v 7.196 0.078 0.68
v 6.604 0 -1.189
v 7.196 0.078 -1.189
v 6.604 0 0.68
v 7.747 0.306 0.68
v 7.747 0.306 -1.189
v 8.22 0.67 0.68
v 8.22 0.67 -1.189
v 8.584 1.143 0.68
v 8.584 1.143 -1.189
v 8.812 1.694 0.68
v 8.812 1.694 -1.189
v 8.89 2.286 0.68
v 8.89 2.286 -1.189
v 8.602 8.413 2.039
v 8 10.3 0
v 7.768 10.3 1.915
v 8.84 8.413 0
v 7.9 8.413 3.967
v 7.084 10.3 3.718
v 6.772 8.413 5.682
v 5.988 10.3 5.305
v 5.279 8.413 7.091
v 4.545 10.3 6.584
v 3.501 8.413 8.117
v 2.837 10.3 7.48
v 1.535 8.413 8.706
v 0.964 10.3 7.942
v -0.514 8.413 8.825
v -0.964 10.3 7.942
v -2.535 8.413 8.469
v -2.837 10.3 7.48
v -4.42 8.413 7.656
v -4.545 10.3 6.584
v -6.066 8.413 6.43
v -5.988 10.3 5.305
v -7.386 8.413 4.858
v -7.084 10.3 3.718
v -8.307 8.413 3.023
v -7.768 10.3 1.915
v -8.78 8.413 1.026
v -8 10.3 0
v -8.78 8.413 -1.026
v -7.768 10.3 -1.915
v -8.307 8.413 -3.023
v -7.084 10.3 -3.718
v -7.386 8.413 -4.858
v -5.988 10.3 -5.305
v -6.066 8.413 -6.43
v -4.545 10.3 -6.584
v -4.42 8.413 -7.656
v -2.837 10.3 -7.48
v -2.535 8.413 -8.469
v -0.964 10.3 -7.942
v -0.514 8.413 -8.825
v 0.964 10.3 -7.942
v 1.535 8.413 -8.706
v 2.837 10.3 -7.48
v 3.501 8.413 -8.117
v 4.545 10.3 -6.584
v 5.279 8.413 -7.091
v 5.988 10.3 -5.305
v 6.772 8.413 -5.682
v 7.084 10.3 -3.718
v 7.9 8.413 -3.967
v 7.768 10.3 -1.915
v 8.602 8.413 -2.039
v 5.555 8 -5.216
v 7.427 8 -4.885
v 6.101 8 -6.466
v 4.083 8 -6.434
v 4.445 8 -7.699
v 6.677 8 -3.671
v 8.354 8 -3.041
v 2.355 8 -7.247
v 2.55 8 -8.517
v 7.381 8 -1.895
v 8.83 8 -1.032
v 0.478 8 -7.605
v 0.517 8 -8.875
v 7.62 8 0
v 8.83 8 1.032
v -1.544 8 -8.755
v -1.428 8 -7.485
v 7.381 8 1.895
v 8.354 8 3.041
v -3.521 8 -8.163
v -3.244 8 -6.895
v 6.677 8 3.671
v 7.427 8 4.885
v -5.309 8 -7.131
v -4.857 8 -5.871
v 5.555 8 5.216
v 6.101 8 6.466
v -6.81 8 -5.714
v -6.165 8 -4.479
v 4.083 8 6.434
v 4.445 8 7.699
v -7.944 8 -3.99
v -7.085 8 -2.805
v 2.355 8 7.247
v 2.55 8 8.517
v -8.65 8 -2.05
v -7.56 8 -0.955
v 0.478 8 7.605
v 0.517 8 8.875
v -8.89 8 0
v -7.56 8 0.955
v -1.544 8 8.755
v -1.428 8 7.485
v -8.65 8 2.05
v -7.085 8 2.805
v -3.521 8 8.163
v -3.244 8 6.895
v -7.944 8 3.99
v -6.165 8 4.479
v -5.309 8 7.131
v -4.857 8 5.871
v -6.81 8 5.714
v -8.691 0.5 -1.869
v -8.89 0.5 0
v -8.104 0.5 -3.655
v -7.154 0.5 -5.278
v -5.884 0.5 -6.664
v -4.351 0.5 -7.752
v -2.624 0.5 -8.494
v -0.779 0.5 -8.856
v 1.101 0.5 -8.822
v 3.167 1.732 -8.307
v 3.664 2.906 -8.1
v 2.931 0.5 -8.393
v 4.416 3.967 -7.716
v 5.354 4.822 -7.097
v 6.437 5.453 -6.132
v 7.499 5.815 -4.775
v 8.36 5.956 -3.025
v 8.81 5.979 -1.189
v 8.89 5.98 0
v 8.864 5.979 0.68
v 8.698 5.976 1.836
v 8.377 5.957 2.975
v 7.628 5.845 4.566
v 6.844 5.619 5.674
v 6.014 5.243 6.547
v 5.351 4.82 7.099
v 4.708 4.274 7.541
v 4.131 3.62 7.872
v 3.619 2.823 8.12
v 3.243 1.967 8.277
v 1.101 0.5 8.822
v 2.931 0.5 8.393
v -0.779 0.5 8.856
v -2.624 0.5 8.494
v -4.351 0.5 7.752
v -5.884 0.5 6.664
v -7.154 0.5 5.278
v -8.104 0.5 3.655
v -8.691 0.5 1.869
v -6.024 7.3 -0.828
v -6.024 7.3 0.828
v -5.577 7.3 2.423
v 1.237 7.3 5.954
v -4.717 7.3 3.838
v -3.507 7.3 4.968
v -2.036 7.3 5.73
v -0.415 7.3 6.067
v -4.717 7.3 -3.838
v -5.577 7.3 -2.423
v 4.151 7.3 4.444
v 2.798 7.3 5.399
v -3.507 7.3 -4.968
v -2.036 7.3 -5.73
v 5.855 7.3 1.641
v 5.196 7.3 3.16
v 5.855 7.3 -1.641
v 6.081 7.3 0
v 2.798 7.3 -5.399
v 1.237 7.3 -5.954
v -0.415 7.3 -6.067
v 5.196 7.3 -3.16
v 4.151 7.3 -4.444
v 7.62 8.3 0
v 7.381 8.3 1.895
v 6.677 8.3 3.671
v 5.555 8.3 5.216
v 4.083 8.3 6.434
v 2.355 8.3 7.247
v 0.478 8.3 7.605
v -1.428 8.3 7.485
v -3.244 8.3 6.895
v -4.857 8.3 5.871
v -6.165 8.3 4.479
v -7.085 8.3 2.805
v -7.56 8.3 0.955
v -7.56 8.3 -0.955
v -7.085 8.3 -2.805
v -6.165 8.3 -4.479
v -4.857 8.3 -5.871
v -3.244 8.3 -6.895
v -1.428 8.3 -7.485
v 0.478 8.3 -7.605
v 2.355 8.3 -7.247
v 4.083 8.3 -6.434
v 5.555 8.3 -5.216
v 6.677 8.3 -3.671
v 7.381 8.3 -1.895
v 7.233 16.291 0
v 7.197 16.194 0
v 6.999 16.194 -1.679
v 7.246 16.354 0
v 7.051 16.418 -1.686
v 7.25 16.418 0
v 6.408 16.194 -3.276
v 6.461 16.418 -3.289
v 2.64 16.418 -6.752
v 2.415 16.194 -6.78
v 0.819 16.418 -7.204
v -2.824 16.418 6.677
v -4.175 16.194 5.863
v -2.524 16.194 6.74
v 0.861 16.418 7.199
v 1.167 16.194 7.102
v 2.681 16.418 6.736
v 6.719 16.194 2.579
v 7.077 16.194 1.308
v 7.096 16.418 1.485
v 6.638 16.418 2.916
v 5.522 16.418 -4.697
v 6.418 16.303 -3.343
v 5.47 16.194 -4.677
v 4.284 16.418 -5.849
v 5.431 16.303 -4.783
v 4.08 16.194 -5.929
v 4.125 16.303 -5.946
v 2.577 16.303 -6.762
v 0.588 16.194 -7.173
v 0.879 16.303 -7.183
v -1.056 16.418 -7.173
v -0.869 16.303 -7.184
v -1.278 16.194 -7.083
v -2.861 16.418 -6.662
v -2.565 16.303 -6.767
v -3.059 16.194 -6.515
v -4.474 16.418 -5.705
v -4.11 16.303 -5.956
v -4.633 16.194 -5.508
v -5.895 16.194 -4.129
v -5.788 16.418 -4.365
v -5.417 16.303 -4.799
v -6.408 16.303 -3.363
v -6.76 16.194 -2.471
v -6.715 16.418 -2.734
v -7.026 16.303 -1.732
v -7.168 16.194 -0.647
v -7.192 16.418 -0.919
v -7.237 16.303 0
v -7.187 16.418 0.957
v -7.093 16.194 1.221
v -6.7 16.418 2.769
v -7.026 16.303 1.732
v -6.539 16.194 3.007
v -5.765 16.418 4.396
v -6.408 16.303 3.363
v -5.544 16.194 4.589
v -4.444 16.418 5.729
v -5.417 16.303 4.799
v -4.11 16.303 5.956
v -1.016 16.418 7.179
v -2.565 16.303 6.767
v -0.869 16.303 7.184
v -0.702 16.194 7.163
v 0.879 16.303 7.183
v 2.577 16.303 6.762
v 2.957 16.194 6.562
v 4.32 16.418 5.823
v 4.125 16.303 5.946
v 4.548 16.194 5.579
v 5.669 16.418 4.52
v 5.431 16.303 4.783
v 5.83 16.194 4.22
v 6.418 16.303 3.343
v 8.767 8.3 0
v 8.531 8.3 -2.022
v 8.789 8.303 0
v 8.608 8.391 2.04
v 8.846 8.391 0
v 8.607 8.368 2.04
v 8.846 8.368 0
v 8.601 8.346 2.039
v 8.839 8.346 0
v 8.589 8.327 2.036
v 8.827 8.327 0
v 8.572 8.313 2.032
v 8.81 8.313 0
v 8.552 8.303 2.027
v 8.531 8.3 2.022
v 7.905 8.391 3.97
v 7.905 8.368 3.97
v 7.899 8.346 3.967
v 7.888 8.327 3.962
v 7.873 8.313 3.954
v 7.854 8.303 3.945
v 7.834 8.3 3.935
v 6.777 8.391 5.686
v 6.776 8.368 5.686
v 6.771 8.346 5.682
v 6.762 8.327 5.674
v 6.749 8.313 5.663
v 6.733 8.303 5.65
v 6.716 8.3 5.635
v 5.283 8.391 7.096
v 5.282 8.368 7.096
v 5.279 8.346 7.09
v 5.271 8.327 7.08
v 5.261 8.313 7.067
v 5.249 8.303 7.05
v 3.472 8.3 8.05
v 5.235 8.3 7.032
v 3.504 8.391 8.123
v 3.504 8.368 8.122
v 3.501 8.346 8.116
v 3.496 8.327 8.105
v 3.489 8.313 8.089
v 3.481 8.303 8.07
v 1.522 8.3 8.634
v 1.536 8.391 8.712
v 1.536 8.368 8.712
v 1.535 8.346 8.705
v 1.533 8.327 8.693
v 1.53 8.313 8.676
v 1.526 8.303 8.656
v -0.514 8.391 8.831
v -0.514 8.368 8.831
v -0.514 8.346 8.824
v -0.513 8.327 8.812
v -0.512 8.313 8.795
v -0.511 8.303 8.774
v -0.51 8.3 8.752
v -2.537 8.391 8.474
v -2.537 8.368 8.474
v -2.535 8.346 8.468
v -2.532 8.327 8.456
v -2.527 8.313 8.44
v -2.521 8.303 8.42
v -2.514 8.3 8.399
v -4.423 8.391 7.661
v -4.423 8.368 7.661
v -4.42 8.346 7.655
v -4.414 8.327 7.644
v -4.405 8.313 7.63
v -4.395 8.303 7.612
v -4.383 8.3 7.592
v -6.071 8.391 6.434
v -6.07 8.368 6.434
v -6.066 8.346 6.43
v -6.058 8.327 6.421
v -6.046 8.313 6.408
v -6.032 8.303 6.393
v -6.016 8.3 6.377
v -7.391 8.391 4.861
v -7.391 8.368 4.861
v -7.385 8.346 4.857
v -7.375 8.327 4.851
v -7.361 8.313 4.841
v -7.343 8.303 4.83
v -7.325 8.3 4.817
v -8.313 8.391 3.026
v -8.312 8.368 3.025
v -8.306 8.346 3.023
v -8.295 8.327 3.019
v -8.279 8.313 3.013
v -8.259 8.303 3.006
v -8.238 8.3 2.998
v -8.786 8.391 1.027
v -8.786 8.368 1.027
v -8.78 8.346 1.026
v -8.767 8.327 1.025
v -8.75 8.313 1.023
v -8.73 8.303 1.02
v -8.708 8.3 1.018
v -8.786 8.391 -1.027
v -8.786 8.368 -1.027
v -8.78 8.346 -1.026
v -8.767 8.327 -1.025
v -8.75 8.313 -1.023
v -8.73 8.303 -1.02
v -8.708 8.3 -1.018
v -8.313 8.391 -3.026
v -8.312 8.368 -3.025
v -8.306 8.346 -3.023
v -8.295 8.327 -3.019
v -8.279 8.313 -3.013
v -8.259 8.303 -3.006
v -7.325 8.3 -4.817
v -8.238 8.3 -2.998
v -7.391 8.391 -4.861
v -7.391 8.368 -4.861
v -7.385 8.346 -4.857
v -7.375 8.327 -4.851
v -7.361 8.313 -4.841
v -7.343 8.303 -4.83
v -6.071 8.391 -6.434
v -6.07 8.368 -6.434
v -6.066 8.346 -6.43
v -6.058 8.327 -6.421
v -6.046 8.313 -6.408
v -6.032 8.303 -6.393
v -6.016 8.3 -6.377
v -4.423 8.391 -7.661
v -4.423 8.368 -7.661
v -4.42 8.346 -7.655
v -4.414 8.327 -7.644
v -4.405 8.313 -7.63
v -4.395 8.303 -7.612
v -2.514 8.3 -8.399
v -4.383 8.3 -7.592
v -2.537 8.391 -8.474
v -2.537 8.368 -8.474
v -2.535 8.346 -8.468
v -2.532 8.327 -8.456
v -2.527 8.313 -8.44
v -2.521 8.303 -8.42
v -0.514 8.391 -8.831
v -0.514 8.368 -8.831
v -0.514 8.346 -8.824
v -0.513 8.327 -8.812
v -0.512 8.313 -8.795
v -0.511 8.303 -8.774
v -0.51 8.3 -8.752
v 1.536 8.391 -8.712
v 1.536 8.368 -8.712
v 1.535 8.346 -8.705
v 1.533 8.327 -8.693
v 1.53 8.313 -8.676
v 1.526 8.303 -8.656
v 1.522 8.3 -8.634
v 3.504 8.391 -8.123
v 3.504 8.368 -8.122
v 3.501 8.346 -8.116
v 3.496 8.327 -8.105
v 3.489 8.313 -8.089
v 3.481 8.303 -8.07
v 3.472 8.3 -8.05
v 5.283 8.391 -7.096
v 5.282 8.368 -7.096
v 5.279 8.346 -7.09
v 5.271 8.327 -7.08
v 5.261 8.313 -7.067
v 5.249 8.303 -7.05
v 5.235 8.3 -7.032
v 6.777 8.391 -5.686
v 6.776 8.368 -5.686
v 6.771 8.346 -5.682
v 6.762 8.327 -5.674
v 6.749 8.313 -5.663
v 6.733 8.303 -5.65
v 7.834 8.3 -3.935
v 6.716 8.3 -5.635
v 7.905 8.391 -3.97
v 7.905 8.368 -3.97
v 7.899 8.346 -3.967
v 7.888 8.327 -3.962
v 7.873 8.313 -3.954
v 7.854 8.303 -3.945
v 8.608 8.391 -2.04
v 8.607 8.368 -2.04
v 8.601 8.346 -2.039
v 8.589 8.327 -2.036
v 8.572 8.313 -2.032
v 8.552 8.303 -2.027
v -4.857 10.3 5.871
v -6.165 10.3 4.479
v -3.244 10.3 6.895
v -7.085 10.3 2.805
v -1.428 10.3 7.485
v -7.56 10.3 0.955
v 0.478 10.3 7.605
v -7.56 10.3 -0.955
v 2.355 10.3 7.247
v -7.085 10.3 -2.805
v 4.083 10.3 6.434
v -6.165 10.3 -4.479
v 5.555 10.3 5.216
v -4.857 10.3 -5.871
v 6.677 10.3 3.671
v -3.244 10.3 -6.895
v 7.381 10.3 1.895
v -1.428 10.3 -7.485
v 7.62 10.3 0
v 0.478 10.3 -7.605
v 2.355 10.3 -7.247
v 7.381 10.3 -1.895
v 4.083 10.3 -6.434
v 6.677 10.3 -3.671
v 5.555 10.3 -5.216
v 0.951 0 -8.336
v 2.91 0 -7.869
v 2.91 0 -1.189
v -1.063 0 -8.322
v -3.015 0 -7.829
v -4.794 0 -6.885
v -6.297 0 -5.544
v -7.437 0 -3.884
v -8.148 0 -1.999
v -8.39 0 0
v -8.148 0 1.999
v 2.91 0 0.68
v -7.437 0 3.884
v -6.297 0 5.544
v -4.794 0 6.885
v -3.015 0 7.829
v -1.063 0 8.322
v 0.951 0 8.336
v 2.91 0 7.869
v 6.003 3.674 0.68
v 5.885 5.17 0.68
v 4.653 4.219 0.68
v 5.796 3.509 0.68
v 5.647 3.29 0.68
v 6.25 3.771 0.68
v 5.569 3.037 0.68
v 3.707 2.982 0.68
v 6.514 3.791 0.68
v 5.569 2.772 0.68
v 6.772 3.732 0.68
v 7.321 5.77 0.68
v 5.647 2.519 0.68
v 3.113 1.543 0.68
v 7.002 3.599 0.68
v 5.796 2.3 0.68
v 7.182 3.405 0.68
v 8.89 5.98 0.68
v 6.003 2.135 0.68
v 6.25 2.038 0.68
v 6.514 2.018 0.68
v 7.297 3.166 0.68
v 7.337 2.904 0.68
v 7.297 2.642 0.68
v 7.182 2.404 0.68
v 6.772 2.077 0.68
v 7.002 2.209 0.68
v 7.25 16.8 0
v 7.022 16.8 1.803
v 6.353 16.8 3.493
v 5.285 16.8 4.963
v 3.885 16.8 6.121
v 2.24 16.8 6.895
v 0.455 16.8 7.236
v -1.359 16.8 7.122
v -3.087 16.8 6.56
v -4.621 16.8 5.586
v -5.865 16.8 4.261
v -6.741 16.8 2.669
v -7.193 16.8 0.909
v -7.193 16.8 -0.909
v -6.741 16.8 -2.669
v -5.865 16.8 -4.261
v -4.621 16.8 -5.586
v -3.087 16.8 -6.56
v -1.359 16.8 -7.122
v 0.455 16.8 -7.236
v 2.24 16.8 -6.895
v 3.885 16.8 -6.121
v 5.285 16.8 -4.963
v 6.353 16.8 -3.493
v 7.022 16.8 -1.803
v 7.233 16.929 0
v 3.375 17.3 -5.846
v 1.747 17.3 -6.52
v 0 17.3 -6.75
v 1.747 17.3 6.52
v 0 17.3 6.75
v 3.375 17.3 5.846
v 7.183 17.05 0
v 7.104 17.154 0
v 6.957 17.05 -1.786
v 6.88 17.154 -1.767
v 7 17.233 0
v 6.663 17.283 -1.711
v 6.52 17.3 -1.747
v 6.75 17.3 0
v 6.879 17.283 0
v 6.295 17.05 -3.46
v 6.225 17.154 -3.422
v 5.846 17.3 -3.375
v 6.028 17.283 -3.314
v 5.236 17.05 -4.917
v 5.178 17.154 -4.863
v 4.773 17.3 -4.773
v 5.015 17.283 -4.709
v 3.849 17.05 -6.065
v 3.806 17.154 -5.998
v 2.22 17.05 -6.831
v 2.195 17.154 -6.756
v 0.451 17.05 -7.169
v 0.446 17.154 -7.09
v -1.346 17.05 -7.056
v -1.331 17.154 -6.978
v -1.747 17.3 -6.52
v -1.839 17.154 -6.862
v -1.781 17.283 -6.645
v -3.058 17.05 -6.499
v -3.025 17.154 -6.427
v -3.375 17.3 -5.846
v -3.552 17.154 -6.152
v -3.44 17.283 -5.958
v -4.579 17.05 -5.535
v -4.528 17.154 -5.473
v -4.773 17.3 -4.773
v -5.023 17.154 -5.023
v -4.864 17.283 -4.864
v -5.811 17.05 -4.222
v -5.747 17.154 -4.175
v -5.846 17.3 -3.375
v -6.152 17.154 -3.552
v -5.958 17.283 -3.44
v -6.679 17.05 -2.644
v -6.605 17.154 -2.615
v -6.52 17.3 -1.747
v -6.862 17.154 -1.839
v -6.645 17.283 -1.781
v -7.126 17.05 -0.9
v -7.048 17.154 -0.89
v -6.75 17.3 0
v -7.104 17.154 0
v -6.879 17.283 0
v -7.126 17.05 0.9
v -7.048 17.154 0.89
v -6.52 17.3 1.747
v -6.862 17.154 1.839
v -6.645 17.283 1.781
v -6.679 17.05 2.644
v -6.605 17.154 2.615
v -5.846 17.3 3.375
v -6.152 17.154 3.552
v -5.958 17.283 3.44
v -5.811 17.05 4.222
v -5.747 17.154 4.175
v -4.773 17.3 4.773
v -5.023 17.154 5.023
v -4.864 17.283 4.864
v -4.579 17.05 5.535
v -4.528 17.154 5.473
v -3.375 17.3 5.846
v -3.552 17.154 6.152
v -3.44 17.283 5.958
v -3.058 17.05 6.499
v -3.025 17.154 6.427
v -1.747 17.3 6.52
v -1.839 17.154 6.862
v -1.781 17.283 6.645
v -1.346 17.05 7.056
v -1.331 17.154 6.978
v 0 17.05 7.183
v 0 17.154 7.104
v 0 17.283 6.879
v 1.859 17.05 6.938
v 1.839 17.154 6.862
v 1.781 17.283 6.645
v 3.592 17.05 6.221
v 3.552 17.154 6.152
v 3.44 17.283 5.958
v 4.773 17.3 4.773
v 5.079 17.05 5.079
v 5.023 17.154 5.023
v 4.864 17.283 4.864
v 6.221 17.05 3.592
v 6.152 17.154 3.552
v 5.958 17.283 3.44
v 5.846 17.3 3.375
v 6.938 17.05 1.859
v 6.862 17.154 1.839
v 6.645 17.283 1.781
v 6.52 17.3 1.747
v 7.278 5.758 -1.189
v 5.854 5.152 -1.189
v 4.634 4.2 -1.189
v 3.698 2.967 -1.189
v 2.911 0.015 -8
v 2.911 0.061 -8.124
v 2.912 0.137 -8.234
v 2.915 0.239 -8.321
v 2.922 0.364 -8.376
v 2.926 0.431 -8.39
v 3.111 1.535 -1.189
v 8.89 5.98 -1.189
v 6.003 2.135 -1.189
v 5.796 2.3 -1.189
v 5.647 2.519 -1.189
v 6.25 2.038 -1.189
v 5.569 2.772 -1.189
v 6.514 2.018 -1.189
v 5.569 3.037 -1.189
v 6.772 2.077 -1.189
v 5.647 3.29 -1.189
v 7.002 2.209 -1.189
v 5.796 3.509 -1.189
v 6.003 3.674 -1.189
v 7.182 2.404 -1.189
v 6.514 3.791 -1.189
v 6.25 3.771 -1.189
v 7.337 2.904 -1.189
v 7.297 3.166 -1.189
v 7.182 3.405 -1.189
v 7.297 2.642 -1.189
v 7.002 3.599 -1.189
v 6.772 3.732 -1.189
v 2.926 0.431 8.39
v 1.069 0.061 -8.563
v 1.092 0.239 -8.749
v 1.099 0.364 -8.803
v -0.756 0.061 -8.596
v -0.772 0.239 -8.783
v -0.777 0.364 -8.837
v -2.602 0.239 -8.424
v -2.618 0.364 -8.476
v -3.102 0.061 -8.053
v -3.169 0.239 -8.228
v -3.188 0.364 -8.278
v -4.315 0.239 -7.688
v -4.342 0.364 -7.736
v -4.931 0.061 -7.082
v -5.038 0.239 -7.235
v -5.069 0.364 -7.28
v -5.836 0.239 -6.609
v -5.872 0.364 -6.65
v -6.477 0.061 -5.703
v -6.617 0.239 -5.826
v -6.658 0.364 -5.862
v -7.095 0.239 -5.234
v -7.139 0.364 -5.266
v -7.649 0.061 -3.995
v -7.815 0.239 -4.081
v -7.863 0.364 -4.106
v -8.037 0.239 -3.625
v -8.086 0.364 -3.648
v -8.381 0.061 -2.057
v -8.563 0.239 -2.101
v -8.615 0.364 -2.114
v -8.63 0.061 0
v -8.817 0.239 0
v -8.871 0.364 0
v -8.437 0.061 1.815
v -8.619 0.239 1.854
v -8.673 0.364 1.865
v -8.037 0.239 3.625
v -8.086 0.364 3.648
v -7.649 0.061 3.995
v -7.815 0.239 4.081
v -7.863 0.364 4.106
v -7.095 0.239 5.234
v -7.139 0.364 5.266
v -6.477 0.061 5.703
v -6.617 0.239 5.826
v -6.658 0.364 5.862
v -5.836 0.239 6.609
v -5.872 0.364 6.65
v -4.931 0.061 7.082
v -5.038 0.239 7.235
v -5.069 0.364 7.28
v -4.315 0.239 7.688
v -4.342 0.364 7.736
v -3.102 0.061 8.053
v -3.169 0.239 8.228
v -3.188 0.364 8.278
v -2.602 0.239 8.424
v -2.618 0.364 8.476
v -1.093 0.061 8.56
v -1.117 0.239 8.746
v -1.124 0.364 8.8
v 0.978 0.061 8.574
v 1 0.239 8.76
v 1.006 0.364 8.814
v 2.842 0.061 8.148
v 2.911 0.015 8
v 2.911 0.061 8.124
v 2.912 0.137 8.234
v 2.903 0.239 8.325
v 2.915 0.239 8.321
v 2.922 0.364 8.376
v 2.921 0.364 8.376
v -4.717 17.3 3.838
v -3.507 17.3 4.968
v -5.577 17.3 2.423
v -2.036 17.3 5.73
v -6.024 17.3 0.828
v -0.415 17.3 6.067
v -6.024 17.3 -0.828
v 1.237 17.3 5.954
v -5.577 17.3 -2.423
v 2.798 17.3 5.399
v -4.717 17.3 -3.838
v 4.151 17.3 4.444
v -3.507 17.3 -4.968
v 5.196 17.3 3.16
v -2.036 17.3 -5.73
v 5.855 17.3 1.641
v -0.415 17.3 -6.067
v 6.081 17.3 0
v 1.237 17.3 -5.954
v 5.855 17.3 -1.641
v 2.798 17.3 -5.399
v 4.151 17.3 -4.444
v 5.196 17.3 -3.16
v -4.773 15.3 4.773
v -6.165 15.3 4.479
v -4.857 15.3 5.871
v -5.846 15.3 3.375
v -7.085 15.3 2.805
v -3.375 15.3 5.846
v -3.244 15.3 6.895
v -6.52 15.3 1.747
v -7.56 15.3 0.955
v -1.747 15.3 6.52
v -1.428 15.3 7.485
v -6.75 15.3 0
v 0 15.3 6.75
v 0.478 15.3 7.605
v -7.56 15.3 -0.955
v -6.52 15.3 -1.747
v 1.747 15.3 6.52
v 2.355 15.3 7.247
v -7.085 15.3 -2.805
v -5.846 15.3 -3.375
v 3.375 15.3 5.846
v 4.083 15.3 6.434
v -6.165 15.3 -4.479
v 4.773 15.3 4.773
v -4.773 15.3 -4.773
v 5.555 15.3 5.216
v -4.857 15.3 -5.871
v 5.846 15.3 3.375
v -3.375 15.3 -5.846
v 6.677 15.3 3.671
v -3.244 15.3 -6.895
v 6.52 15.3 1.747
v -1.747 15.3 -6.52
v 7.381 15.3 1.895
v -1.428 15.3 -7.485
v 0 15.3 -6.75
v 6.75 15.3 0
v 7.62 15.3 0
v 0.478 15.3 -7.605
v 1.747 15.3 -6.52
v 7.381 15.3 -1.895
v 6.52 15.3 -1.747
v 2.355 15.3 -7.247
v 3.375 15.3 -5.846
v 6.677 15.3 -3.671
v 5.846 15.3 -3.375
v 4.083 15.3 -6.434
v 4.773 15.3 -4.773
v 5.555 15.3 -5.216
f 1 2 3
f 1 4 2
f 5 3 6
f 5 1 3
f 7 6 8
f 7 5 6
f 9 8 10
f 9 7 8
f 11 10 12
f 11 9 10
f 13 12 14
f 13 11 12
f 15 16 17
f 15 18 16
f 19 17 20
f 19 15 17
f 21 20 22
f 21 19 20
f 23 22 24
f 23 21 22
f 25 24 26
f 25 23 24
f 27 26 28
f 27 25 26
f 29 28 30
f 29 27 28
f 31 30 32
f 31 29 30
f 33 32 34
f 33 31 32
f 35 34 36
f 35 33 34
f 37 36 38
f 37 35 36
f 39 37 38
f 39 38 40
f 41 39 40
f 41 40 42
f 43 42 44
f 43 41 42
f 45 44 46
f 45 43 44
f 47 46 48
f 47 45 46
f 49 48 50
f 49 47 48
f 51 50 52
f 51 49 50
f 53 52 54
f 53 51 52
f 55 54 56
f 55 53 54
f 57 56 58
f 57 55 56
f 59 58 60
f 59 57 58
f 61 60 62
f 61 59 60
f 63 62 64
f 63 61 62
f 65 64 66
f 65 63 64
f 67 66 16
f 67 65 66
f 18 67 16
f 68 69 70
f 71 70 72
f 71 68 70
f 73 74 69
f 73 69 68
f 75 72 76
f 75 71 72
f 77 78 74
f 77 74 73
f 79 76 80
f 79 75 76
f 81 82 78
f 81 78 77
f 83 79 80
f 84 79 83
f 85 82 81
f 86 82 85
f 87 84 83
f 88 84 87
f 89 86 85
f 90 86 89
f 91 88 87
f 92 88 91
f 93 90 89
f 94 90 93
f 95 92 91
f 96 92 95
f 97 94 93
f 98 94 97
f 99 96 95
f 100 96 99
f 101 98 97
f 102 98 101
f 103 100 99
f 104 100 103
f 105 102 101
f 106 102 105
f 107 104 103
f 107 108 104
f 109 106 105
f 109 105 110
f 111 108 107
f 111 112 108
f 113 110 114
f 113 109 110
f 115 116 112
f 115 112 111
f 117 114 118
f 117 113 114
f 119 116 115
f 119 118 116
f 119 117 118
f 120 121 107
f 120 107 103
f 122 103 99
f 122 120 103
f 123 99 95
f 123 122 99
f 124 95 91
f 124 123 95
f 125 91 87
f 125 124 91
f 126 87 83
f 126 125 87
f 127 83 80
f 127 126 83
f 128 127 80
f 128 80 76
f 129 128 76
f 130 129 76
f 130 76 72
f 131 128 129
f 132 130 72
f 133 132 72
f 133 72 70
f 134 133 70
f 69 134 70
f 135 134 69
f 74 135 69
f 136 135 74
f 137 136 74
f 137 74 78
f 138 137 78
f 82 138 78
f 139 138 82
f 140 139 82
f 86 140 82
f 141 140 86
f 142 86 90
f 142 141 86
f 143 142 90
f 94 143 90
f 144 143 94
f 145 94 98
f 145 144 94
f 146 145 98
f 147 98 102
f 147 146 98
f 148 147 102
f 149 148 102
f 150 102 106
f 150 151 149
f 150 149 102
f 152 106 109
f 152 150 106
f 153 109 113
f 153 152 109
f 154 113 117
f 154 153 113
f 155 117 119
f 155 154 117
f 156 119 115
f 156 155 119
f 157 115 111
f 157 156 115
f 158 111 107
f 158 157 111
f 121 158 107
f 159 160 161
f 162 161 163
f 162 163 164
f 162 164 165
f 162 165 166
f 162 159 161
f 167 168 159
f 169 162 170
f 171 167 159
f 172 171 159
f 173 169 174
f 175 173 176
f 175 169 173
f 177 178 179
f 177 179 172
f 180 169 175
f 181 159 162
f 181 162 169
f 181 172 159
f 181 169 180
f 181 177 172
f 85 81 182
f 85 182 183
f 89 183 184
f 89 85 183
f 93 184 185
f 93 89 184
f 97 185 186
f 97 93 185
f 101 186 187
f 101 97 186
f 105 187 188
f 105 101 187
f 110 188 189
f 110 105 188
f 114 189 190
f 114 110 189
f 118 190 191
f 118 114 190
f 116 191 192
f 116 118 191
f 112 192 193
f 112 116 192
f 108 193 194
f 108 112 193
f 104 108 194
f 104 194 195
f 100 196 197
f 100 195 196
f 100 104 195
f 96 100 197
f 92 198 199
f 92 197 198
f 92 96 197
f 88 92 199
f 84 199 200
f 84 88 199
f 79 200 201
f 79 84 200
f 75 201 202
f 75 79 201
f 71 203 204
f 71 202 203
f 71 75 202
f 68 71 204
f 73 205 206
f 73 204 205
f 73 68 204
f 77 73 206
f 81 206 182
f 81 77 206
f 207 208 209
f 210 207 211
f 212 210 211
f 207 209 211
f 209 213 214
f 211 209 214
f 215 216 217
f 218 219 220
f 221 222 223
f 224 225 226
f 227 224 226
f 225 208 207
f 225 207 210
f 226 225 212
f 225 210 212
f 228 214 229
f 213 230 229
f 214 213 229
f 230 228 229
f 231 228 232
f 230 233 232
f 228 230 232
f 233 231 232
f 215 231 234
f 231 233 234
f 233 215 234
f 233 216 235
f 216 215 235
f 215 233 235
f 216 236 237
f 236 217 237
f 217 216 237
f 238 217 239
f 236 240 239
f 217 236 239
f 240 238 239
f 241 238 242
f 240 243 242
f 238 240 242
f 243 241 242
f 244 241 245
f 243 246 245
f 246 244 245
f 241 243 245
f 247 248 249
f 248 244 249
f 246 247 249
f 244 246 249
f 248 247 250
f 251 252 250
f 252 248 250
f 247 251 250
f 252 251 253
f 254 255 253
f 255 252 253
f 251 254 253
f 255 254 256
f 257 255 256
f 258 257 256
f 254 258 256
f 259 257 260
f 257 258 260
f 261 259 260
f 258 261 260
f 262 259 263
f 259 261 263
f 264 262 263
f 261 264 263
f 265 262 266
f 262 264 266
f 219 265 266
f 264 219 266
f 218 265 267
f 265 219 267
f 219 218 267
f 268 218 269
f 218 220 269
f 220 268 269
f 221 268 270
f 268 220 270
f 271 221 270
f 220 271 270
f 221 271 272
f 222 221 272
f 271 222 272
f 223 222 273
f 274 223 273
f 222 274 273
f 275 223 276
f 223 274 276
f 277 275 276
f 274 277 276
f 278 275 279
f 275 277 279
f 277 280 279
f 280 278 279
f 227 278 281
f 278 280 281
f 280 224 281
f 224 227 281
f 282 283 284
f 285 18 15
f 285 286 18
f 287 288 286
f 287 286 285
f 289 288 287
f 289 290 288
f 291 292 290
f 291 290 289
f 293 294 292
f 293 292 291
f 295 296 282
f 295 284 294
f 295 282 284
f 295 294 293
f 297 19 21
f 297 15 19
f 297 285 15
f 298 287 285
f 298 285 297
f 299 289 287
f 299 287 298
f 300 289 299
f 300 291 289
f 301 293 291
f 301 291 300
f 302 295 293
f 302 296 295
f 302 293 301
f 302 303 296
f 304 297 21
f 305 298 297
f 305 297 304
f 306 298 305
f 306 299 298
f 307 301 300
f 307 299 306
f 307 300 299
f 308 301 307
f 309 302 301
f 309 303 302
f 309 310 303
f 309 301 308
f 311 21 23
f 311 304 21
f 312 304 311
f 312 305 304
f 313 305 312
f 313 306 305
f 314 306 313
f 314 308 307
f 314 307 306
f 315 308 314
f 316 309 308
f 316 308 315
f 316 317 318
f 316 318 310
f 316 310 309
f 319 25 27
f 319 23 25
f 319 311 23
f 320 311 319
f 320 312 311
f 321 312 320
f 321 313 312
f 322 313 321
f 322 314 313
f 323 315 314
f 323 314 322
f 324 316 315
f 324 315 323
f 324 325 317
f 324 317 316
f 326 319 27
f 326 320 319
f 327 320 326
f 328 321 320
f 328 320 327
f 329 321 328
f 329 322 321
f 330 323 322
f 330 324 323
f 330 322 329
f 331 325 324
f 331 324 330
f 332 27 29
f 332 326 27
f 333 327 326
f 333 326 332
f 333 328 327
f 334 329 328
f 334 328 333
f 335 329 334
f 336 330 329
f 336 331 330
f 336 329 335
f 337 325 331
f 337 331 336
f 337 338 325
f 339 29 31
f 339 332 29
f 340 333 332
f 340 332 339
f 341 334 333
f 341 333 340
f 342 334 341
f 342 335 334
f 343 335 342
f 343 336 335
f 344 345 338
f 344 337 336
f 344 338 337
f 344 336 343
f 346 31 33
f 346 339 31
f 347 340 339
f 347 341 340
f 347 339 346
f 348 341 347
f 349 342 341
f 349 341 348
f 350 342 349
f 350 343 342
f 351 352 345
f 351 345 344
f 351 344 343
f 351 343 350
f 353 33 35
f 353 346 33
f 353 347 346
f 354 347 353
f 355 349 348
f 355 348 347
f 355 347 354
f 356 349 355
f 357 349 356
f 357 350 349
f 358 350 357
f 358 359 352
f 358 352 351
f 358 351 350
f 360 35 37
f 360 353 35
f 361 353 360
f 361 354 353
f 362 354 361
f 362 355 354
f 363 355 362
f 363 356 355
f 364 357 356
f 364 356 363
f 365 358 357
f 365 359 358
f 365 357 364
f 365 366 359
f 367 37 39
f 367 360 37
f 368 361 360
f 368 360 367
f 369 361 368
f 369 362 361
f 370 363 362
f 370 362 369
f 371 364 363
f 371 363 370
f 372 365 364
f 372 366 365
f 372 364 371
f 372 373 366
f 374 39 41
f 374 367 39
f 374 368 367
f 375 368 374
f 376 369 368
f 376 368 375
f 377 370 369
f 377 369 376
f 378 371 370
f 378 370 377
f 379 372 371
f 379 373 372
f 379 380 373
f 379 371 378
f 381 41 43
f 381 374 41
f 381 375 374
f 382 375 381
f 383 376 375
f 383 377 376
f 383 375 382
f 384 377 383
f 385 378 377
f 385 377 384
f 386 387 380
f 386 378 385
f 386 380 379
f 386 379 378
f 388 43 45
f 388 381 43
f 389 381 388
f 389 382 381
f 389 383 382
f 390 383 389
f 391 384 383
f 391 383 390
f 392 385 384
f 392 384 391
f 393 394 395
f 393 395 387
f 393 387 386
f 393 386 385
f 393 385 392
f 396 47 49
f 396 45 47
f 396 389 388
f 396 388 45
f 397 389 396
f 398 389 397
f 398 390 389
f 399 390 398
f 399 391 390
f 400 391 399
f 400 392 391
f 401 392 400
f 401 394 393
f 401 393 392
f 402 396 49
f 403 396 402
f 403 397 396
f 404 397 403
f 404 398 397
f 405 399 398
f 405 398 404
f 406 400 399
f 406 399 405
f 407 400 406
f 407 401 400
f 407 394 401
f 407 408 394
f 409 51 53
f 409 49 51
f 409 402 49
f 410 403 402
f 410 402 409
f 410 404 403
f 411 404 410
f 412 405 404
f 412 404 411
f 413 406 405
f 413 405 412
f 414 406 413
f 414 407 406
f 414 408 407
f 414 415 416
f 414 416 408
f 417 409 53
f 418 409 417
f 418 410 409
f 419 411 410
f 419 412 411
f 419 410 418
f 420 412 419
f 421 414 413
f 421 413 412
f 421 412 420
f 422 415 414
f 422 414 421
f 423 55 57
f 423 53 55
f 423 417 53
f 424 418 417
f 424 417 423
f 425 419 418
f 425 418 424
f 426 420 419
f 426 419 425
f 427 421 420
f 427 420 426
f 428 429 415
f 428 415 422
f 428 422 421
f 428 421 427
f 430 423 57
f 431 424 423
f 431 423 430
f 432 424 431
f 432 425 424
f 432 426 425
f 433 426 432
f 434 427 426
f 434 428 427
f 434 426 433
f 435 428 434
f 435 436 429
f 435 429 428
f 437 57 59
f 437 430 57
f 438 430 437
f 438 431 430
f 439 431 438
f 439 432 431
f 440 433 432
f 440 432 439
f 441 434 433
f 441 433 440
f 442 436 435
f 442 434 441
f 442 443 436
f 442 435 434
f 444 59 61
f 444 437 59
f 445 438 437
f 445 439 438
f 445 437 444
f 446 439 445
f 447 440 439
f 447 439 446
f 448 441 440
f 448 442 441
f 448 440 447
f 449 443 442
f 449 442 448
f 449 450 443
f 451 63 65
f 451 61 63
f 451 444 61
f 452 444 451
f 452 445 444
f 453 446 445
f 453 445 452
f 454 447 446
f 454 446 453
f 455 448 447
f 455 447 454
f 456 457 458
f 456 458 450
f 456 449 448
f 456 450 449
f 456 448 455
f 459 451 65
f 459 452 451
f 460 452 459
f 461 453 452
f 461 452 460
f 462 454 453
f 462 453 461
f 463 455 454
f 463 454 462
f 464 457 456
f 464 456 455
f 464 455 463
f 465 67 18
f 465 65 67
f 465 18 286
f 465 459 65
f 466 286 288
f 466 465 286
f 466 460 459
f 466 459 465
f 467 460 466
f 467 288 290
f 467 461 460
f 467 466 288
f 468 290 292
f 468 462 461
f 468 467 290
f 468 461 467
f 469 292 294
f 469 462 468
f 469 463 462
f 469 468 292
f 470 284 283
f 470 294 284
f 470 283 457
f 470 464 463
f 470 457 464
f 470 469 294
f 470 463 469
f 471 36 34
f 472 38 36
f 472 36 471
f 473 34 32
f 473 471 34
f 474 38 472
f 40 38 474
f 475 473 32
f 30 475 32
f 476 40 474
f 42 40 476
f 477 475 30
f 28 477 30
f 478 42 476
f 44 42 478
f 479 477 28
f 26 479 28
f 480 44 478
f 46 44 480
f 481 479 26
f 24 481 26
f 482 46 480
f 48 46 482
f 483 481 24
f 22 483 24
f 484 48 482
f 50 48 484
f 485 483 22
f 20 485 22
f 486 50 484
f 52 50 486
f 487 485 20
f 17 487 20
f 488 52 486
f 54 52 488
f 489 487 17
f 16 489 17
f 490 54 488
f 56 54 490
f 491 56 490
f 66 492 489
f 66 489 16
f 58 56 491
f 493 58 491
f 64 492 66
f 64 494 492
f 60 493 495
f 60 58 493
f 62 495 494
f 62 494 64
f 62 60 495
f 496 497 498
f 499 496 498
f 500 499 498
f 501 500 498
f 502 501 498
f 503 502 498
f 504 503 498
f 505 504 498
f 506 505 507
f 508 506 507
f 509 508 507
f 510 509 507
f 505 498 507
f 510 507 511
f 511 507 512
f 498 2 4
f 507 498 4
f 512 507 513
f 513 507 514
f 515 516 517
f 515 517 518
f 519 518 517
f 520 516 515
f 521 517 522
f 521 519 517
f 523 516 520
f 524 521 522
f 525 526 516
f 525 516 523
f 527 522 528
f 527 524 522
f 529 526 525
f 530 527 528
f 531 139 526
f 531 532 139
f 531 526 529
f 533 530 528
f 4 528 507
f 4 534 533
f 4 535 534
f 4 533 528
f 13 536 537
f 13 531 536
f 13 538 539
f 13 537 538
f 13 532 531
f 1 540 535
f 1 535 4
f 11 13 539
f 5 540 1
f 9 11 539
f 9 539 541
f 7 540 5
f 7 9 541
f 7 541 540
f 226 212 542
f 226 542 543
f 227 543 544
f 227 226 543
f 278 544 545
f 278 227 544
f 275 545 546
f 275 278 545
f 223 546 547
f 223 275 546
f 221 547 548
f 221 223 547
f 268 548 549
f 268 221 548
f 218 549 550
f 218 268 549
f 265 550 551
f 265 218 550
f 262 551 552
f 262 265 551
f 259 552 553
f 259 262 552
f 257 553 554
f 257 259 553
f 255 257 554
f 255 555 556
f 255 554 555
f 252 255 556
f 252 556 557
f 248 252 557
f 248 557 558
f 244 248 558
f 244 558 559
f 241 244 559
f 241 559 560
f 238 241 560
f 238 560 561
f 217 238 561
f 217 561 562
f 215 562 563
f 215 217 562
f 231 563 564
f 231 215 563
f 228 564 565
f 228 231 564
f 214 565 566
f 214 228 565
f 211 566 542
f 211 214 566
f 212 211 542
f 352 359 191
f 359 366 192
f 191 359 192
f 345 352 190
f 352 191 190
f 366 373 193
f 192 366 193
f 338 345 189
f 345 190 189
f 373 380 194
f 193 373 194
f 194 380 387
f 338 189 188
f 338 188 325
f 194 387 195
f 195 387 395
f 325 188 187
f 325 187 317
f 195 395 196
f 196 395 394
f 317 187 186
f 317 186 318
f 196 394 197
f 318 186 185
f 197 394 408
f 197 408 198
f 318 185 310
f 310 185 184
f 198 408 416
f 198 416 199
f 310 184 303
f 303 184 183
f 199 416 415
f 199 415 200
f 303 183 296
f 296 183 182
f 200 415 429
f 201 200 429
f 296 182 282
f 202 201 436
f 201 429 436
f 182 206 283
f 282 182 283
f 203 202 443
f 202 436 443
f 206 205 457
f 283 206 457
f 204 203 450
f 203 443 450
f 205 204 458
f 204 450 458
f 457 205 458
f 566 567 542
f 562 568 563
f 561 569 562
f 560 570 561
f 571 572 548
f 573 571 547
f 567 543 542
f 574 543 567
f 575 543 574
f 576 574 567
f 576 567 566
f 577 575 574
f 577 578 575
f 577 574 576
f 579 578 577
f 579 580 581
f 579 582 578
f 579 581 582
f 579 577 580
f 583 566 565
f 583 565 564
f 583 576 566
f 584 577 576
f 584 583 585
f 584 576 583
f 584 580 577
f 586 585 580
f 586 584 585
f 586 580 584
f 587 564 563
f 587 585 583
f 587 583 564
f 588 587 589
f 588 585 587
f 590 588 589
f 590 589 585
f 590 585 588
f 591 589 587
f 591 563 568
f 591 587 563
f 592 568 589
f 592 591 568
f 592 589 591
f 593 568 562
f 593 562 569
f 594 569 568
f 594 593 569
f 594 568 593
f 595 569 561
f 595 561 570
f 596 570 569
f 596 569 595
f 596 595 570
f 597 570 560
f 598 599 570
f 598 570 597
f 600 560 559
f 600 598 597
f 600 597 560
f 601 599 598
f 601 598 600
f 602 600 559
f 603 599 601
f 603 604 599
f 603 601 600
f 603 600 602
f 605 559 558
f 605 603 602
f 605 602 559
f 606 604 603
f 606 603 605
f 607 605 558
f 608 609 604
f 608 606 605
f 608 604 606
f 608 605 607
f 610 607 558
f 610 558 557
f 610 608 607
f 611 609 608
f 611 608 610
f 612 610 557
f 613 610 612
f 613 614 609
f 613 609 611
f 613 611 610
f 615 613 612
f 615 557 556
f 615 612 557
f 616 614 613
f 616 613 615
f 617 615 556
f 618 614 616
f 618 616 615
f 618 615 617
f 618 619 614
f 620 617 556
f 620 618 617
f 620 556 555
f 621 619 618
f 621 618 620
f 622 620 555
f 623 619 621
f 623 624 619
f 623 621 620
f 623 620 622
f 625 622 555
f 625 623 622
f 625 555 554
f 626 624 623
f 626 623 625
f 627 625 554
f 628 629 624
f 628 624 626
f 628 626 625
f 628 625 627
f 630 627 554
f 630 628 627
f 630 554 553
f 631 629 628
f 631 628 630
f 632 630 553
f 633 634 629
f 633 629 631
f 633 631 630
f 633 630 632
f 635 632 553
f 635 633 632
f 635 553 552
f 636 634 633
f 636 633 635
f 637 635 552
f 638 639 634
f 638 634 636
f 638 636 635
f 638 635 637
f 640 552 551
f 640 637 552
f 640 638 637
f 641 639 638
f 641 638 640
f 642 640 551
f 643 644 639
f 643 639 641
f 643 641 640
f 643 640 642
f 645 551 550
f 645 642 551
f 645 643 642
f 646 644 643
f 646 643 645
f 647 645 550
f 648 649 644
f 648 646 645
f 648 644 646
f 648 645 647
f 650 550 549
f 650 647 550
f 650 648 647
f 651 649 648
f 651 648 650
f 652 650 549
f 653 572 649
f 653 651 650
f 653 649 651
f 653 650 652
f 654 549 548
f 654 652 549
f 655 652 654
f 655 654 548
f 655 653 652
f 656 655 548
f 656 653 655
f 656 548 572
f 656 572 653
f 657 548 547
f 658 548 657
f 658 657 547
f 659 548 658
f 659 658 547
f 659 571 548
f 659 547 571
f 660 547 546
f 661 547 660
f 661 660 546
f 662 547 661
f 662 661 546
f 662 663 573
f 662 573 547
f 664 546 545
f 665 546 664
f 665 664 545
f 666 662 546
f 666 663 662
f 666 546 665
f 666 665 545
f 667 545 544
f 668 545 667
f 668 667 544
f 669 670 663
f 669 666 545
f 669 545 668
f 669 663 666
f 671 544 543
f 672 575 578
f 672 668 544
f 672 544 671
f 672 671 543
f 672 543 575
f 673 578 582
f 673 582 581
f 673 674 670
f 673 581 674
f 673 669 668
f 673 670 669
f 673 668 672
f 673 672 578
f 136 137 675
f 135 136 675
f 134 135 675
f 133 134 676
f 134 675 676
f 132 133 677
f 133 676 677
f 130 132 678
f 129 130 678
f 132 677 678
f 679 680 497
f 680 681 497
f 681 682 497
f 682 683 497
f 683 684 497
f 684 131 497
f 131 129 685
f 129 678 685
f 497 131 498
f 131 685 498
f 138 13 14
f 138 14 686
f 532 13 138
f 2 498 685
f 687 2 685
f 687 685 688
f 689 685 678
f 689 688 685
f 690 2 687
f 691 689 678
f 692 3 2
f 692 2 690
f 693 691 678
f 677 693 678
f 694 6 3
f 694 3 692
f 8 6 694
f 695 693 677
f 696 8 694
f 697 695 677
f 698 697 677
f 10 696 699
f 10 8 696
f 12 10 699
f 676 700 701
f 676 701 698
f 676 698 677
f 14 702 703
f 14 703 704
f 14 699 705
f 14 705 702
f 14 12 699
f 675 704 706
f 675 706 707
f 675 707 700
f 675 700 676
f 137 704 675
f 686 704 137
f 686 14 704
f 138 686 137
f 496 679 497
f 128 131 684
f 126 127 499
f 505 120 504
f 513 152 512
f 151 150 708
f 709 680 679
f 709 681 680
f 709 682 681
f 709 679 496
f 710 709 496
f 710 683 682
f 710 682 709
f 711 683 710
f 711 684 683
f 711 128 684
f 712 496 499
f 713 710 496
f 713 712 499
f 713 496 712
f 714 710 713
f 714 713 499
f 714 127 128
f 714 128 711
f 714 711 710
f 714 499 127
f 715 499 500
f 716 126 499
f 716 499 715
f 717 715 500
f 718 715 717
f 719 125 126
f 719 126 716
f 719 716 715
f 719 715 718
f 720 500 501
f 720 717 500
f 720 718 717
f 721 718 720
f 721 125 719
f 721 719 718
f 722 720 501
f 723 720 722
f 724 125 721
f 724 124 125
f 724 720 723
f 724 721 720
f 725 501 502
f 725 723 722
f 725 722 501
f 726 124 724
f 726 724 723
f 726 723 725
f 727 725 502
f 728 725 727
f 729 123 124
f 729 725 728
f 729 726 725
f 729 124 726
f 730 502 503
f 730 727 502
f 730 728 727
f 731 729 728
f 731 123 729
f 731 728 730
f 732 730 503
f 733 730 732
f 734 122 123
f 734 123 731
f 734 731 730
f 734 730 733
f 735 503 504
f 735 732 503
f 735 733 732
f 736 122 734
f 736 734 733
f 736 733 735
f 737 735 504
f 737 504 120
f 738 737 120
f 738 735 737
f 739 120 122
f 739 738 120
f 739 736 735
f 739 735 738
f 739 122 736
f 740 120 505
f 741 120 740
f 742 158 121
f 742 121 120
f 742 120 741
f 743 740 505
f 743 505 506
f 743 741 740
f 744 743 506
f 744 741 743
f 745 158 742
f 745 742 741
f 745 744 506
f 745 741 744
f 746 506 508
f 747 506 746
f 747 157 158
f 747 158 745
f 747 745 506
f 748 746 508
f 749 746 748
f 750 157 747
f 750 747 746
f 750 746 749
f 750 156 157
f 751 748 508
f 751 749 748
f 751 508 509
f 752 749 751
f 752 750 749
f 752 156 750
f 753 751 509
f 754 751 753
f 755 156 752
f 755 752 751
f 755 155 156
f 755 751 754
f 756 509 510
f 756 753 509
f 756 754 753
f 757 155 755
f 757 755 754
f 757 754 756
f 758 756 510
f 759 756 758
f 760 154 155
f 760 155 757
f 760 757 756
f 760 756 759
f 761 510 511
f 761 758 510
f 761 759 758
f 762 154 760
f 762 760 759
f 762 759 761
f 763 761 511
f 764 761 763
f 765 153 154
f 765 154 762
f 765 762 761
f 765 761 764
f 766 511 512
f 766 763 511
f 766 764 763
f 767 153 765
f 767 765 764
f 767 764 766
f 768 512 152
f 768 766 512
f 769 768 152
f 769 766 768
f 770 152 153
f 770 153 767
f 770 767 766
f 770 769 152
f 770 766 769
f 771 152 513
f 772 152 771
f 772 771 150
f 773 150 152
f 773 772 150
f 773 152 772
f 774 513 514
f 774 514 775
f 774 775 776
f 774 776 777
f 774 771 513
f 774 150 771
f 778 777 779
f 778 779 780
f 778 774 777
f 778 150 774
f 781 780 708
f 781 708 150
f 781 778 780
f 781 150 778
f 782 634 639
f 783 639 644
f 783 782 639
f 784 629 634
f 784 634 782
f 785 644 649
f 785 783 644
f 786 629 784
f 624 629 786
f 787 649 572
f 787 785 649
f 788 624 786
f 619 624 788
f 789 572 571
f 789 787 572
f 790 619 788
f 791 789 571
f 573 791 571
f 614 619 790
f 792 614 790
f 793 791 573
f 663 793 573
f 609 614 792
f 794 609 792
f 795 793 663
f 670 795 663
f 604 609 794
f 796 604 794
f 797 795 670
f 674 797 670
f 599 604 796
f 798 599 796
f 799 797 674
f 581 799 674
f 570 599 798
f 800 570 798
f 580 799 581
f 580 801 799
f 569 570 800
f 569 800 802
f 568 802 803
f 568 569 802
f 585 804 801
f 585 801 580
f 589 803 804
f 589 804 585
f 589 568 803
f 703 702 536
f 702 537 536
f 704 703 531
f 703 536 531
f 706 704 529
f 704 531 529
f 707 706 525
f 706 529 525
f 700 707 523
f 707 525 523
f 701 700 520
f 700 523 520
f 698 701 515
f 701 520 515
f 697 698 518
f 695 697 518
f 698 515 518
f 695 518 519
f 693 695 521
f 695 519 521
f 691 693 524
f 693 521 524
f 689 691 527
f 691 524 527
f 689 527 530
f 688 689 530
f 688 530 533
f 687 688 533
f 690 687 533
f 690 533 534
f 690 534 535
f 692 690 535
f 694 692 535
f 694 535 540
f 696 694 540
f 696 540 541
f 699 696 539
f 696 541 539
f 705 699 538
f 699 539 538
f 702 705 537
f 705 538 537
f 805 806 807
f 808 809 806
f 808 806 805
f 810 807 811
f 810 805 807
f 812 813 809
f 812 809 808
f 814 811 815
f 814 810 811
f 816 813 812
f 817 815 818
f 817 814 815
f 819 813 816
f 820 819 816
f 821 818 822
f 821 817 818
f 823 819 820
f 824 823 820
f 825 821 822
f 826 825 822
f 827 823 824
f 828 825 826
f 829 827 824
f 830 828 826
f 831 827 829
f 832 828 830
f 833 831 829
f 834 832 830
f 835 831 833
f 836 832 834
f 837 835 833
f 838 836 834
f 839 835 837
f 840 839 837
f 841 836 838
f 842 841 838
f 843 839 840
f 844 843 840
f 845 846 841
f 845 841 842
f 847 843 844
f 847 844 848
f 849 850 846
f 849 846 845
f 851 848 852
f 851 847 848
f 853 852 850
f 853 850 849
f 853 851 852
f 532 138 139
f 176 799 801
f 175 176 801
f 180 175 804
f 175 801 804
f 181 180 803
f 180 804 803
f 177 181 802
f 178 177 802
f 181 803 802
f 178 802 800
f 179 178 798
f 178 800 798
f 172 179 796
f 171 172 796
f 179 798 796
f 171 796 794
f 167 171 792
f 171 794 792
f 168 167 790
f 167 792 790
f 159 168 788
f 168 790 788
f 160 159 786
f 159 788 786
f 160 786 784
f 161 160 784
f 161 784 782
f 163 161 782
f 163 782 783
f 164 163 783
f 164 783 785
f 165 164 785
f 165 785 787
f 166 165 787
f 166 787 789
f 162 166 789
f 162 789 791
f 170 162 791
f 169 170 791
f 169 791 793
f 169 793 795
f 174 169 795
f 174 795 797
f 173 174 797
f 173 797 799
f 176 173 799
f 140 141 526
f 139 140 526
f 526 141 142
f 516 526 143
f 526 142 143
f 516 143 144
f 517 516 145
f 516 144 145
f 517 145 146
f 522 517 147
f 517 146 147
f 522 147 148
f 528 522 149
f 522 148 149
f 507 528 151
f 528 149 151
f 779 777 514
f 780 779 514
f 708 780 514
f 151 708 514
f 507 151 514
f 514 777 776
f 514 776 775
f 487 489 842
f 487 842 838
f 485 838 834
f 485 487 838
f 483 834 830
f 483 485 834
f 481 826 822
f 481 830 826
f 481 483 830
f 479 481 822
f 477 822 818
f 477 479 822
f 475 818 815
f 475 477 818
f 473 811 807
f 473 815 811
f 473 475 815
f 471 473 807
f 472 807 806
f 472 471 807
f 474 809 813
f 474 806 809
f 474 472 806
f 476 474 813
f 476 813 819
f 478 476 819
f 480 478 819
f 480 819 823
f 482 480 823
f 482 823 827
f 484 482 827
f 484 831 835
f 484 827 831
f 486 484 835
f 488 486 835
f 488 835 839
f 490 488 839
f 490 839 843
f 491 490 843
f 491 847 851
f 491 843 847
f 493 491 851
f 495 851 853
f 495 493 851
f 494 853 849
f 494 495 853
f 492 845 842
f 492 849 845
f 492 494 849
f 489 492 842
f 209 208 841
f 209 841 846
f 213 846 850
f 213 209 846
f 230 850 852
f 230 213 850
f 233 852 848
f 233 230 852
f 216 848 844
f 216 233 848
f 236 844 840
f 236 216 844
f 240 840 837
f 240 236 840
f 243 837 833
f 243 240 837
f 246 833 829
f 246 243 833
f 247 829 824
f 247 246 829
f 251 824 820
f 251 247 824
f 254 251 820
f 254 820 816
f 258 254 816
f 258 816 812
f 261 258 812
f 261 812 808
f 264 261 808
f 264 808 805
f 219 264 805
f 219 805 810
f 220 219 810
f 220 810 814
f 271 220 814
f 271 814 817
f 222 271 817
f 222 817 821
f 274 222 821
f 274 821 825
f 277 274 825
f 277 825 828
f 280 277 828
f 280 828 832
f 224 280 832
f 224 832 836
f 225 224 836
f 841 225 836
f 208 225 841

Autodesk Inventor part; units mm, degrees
sketch "Sketch1" plane through (0, 0, 0) normal (0, 1, 0) x (-1, 0, 0)
  circle A0 centre (0, 0) radius 8.89
  dimension "d0" = 17.78
extrude "Extrusion1" add sketch "Sketch1" along normal blind 8
sketch "Sketch2" plane through (0, 8, 0) normal (0, 1, 0) x (1, 0, 0)
  circle A0 centre (0, 0) radius 7.62
  dimension "d3" = 15.24
extrude "Extrusion2" add sketch "Sketch2" along normal blind 0.3
ref_plane "Work Plane1" through (0, 10.3, 0) normal (0, 1, 0) x (1, 0, 0)
sketch "Sketch4" plane through (0, 10.3, 0) normal (0, 1, 0) x (1, 0, 0)
  circle A0 centre (0, 0) radius 8
  dimension "d7" = 16
sketch "Sketch5" plane through (0, 8.3, 0) normal (0, 1, 0) x (1, 0, 0)
  circle A0 centre (0, 0) radius 8.89
  dimension "d8" = 17.78
loft "Loft1" add profiles "Sketch5", "Sketch4"
sketch "Sketch6" plane through (0, 10.3, 0) normal (0, 1, 0) x (1, 0, 0)
  circle A0 centre (0, 0) radius 7.62
  dimension "d13" = 15.24
extrude "Extrusion3" add sketch "Sketch6" along normal blind 5
sketch "Sketch7" plane through (0, 15.3, 0) normal (0, 1, 0) x (1, 0, 0)
  circle A0 centre (0, 0) radius 6.75
  dimension "d16" = 13.5
ref_plane "Work Plane2" through (0, 16.3, 0) normal (0, 1, 0) x (1, 0, 0)
sketch "Sketch8" plane through (0, 16.3, 0) normal (0, 1, 0) x (1, 0, 0)
  circle A0 centre (0, 0) radius 7.25
  dimension "d18" = 14.5
loft "Loft2" add profiles "Sketch7", "Sketch8"
fillet "Fillet1" radius 0.08 1 edges at (-8.89, 8.3, 0)
thread "Thread1" size "0.390-27 UNS" class "2A" standard "ANSI Unified Screw Threads" length 8.001
sketch "Sketch9" plane through (0, 16.3, 0) normal (0, 1, 0) x (1, 0, 0)
  circle A0 centre (0, 0) radius 7.25
extrude "Extrusion4" add sketch "Sketch9" along normal blind 1
ref_plane "Work Plane3" through (0, 0, 8.89) normal (0, 0, 1) x (1, 0, 0)
sketch "Sketch10" plane through (0, 0, 8.89) normal (0, 0, 1) x (1, 0, 0)
  line L0 (8.89, 0) -> (-8.89, 0) projected
  circle A0 centre (8.89, 0) radius 5.9795
  point P0 (0, 0)
extrude "Extrusion5" cut sketch "Sketch10" against normal blind 80
ref_plane "Work Plane4" through (8.89, 0, 0) normal (1, 0, 0) x (0, 1, 0)
sketch "Sketch11" plane through (8.89, 0, 0) normal (1, 0, 0) x (0, 1, 0)
  line L0 (0, -8.89) -> (0, 8.89) projected
  line L1 (5.9795, 0.6803) -> (0, 0.6803)
  line L2 (0, 0.6803) -> (0, -1.1889)
  line L3 (0, -1.1889) -> (5.9795, -1.1889)
  line L4 (5.9795, -1.1889) -> (5.9795, 0.6803)
  point P0 (0, 0)
  point P1 (0, -8.4001)
  point P2 (0, 8.4001)
extrude "Extrusion6" add sketch "Sketch11" against normal up to surface
sketch "Sketch12" plane through (8.89, 0, 0.6803) normal (0, 0, 1) x (1, 0, 0)
  circle A0 centre (-2.4423, 2.9044) radius 0.889
  point P0 (-8.89, 0)
  dimension "d34" = 1.778
extrude "Extrusion7" cut sketch "Sketch12" against normal blind 80
fillet "Fillet2" radius 2.286 1 edges at (8.89, 0, -0.2543)
fillet "Fillet3" radius 0.5 2 edges at (-5.1555, 0, 7.2424) (-5.1555, 0, -7.2424)
fillet "Fillet4" radius 0.5 1 edges at (-7.25, 16.3, 0)
fillet "Fillet5" radius 0.5 1 edges at (-7.25, 17.3, 0)
sketch "Sketch13" plane through (0, 17.3, 0) normal (0, 1, 0) x (1, 0, 0)
  circle A0 centre (0, 0) radius 6.0809
extrude "Extrusion8" cut sketch "Sketch13" against normal blind 10
properties part number "Tail Cap"
